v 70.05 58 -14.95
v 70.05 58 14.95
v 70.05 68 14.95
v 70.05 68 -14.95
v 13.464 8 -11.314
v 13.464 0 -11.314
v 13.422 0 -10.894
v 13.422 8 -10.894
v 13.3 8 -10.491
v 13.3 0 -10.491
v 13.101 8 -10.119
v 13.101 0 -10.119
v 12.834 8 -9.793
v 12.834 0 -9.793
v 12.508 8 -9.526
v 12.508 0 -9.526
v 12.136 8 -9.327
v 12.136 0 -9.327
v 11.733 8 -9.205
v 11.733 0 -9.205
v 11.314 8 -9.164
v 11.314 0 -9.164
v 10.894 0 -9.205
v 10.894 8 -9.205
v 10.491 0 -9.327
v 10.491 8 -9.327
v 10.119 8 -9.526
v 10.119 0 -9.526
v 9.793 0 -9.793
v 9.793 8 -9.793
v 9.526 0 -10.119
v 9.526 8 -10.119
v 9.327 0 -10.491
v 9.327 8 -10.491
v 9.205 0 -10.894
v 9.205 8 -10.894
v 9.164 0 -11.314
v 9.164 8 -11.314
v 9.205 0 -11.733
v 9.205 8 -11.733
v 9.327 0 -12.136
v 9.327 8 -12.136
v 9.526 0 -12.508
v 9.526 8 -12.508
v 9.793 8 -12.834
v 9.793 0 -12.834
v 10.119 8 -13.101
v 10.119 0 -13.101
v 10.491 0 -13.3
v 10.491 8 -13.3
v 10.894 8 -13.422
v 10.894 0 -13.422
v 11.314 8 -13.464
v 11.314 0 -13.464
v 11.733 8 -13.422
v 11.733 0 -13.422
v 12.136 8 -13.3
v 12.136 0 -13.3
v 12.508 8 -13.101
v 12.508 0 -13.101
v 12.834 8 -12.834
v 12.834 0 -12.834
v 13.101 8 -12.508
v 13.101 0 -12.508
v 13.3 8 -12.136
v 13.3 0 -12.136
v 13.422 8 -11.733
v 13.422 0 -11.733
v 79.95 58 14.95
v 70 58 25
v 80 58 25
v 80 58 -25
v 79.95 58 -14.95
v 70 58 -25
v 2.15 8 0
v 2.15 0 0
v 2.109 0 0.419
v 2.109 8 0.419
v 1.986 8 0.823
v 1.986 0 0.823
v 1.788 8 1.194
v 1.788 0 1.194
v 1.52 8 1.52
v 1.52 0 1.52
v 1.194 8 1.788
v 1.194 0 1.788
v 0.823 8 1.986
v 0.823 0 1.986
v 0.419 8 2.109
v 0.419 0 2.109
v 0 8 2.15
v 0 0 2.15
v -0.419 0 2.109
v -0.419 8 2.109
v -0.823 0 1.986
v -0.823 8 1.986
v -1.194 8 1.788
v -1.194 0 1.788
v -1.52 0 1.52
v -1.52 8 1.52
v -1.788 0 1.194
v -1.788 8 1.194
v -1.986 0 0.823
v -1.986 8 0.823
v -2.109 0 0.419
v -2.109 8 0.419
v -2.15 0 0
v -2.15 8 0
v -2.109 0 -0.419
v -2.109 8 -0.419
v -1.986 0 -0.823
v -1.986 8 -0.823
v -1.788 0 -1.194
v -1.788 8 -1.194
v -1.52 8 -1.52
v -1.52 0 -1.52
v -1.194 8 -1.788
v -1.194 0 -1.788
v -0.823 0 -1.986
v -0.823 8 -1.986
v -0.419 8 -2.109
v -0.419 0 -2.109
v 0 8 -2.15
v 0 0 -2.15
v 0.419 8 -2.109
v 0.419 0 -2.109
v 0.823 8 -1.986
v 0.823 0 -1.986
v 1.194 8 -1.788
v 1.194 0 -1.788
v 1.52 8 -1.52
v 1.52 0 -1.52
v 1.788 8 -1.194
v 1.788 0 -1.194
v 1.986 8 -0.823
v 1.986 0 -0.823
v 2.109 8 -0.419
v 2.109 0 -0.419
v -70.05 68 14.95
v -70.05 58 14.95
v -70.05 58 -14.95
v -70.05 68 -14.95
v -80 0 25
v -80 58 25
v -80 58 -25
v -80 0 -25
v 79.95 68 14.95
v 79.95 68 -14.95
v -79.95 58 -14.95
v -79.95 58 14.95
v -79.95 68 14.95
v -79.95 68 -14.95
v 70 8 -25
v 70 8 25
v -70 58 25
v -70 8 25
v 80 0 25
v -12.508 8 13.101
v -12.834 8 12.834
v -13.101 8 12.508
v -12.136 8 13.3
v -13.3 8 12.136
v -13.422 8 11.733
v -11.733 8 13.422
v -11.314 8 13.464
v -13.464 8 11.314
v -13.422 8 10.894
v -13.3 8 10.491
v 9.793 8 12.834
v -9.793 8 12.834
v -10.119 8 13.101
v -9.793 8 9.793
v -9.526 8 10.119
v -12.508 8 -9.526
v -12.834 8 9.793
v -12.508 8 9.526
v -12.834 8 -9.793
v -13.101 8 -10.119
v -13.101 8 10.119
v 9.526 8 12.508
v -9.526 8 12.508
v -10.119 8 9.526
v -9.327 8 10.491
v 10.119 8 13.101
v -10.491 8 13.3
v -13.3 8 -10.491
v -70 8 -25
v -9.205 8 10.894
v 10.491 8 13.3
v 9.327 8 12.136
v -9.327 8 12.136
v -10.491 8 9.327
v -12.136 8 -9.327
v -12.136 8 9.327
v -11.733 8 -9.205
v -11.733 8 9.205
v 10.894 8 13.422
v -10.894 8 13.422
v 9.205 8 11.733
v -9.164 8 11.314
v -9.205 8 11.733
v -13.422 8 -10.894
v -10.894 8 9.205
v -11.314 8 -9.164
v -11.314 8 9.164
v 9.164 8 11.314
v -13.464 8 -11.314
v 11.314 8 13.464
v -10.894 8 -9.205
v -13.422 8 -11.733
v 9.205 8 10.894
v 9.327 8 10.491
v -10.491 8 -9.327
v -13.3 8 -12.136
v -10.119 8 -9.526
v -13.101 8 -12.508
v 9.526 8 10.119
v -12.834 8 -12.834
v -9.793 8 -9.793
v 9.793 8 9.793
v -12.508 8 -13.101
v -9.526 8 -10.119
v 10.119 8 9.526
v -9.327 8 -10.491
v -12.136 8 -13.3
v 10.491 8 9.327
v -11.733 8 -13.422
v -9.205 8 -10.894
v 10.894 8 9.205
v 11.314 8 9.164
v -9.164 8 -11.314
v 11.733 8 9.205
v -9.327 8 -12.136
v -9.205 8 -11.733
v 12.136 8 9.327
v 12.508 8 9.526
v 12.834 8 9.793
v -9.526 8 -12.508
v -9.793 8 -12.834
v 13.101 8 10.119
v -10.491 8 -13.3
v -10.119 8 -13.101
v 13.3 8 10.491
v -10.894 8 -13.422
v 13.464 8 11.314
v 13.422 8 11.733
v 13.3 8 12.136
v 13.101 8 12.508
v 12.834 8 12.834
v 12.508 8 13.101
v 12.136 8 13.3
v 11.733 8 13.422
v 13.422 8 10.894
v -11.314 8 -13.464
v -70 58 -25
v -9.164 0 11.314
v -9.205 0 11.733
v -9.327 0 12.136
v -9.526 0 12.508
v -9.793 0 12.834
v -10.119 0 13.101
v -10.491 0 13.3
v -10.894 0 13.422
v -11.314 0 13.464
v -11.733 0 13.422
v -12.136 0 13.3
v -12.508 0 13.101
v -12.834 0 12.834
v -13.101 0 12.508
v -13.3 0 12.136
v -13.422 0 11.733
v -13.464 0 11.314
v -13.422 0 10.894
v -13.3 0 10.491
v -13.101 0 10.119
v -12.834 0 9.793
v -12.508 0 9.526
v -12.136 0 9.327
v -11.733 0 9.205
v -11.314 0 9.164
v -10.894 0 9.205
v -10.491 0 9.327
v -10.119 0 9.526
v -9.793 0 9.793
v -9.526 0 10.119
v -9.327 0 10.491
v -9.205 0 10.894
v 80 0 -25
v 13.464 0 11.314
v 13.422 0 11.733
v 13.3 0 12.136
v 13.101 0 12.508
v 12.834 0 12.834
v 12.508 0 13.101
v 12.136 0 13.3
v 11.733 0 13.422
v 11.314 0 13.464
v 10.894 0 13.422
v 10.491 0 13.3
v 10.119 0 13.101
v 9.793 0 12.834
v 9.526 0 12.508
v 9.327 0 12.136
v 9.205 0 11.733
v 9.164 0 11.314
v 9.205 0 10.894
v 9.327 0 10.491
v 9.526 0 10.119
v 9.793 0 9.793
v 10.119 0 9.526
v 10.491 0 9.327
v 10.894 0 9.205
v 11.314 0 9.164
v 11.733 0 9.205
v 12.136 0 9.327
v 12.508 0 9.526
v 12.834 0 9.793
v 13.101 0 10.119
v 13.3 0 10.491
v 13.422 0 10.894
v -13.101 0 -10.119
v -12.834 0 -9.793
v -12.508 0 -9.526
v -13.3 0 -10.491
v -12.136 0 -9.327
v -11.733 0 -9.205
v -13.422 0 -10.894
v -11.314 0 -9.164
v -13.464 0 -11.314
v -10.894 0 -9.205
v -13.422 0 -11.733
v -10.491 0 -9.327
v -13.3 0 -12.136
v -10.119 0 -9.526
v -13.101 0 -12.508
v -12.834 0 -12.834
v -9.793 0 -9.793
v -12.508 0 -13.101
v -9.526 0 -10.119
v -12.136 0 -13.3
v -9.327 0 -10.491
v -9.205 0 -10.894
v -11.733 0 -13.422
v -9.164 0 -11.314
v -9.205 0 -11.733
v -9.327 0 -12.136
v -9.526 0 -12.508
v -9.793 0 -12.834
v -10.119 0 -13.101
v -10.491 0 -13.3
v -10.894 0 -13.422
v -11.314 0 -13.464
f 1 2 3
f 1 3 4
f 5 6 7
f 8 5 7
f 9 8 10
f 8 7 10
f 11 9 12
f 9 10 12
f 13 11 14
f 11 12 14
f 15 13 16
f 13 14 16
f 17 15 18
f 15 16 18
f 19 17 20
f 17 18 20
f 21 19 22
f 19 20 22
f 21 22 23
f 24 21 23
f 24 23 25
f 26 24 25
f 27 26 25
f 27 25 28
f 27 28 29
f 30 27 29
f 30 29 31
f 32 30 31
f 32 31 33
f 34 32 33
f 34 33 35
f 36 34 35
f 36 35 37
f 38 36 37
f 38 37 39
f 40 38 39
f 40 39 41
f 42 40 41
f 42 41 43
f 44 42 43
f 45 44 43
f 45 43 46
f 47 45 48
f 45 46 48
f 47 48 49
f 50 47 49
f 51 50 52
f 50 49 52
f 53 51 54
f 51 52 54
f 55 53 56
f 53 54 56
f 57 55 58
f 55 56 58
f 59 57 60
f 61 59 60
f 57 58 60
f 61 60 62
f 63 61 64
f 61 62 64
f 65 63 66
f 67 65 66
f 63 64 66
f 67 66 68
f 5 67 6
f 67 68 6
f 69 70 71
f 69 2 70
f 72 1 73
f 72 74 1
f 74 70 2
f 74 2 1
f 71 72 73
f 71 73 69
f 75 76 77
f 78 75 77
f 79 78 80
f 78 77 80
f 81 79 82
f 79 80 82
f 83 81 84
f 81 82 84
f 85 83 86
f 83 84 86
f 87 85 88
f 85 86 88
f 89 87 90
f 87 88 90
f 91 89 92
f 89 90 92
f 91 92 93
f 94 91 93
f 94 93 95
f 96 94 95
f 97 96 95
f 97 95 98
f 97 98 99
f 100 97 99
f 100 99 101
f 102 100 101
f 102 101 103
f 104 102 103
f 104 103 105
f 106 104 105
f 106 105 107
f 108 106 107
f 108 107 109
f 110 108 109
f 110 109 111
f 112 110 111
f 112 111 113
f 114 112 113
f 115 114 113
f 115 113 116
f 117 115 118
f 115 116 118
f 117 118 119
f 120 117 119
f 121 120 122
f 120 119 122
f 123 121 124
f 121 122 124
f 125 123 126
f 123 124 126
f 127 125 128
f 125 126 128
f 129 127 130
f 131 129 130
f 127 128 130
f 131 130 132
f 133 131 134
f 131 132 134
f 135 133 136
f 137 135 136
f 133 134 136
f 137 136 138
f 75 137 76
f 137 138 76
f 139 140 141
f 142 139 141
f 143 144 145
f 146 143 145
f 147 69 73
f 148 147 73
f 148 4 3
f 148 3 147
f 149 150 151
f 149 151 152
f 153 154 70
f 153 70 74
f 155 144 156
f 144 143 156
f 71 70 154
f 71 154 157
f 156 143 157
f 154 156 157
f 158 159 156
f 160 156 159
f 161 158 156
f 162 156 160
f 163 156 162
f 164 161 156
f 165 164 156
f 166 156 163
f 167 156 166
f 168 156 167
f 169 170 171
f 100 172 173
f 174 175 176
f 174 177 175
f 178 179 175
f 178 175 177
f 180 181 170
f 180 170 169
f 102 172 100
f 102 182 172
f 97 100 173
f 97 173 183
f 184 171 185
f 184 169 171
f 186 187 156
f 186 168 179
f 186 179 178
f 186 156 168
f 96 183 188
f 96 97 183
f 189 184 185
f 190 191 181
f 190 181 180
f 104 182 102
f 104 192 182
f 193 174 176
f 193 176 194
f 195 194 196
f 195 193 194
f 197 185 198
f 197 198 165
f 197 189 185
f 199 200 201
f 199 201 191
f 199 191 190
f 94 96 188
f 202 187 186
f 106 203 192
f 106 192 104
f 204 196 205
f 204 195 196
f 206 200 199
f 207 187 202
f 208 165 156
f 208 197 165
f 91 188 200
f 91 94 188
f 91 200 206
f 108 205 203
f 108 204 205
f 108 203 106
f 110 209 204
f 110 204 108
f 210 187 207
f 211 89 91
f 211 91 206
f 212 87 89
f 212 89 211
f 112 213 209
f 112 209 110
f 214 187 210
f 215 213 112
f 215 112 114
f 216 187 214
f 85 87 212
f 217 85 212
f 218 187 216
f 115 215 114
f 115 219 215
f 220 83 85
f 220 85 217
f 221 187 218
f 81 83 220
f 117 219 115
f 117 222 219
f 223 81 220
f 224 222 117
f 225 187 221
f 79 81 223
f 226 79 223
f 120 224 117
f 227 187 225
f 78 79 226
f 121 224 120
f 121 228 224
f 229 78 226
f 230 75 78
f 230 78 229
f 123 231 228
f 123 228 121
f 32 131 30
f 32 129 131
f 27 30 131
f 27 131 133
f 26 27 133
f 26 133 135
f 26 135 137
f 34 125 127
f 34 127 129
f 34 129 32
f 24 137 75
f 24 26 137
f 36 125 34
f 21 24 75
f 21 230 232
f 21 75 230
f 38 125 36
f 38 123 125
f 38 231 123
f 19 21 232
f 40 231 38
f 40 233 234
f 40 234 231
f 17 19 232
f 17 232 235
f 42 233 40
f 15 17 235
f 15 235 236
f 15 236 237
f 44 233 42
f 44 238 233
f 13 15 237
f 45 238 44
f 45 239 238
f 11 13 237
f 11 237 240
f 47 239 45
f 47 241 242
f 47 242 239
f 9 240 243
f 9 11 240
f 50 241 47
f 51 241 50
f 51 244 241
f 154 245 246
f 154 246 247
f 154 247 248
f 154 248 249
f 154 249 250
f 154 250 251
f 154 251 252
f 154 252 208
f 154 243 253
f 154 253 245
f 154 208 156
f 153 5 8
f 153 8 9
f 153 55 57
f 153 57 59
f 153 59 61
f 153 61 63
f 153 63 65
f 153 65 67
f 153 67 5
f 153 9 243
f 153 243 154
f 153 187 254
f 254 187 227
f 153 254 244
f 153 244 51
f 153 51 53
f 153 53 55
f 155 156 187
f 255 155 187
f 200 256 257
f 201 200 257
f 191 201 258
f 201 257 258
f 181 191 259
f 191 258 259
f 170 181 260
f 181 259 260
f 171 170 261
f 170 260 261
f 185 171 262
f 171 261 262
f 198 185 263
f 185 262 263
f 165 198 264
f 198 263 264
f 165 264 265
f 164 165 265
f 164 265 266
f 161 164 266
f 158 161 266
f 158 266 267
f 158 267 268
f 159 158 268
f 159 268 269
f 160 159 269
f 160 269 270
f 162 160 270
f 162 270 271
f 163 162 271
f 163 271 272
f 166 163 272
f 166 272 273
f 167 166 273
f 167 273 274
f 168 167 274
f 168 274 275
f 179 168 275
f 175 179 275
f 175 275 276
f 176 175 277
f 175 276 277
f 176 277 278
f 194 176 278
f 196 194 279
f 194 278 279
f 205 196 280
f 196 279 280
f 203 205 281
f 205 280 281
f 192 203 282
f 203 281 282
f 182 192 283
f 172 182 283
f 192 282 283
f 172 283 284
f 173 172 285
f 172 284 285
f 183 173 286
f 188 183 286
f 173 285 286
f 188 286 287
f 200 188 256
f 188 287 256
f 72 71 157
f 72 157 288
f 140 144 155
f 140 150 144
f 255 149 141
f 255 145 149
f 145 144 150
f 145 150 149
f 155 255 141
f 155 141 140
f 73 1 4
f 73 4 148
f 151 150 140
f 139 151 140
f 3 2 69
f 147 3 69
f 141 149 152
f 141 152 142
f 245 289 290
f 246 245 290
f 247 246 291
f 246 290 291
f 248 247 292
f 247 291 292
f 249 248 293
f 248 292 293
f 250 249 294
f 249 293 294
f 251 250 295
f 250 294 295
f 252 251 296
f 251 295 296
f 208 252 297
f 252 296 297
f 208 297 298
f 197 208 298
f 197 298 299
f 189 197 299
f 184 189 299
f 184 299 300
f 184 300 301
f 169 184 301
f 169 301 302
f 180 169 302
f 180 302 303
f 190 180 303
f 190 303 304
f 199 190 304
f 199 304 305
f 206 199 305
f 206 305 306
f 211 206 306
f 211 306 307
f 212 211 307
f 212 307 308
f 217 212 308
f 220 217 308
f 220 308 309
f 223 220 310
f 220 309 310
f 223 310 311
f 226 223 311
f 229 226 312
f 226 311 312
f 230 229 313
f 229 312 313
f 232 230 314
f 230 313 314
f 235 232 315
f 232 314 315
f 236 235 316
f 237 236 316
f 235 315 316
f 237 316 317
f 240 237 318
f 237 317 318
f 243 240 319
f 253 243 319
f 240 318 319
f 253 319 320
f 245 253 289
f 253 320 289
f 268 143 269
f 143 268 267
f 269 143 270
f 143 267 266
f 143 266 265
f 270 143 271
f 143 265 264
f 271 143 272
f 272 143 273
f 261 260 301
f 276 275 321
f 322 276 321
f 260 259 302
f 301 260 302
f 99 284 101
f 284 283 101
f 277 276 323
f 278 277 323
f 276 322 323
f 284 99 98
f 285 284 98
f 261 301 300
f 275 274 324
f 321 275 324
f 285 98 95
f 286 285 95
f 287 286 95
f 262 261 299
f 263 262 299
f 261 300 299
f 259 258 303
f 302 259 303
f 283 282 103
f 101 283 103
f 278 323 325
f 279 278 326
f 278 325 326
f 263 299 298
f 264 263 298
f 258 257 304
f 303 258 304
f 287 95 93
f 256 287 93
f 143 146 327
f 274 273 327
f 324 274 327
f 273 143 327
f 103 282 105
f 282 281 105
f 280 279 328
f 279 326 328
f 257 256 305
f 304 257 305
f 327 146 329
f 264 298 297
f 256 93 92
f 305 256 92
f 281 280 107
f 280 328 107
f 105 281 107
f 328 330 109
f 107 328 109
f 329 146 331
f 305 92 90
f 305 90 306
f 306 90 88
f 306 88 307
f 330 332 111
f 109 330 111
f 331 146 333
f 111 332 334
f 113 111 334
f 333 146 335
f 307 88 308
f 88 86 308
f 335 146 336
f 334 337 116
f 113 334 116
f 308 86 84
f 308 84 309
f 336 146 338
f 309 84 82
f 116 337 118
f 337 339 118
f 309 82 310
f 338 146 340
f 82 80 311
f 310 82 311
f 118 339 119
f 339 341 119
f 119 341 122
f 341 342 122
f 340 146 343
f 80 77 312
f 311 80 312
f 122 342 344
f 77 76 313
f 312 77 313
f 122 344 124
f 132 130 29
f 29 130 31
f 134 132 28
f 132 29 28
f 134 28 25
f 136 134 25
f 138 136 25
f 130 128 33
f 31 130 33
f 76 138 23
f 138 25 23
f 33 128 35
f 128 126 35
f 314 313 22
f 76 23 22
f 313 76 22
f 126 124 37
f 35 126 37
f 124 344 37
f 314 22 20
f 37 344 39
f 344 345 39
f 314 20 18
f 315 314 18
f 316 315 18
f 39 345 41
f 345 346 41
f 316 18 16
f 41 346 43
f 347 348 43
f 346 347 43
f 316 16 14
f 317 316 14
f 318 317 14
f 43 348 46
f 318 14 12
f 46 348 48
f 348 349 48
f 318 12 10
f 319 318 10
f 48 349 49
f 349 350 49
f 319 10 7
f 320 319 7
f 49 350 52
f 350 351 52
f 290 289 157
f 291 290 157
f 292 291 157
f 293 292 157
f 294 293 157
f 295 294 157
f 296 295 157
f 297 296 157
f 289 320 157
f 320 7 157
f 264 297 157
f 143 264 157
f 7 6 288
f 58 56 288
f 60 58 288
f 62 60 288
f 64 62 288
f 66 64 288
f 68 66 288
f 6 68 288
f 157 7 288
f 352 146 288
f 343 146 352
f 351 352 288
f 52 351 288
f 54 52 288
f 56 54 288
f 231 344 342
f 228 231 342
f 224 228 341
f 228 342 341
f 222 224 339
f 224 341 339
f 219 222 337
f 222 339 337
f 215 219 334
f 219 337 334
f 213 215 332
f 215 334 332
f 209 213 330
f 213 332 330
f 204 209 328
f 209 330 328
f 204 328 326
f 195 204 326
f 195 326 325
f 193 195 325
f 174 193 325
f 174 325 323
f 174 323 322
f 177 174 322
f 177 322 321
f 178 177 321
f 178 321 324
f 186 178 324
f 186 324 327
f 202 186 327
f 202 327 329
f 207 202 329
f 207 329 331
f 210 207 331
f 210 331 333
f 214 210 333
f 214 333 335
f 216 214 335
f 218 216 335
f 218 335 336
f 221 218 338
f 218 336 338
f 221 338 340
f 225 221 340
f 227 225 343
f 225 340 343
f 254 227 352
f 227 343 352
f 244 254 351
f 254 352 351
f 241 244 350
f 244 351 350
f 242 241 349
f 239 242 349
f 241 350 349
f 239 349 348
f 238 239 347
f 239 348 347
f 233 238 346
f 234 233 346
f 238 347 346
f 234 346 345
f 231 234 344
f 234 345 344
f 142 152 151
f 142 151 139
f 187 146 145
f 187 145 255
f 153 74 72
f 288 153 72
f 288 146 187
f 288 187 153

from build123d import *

# Parameters (mm, degrees)
SKETCH1_W           = 160
SKETCH1_H           = 50
BOSS_EXTRUDE1_DEPTH = 8
SKETCH2_W           = 10
SKETCH2_H           = 50
BOSS_EXTRUDE2_DEPTH = 50
SKETCH3_W           = 9.9
SKETCH3_H           = 29.9
BOSS_EXTRUDE3_DEPTH = 10
CUT_EXTRUDE1_REACH  = 70
SKETCH4_R           = 2.15


with BuildPart() as part:
    # Sketch1 → Boss-Extrude1 (new body)
    with BuildSketch(Plane(origin=(0, 0, 0), x_dir=(1, 0, 0), z_dir=(0, 1, 0))):
        Rectangle(SKETCH1_W, SKETCH1_H)
    extrude(amount=BOSS_EXTRUDE1_DEPTH)

    # Sketch2 → Boss-Extrude2 (add)
    with BuildSketch(Plane(origin=(0, 8, 0), x_dir=(1, 0, 0), z_dir=(0, 1, 0))):
        with Locations((-75, 0)):
            Rectangle(SKETCH2_W, SKETCH2_H)
        with Locations((75, 0)):
            Rectangle(SKETCH2_W, SKETCH2_H)
    extrude(amount=BOSS_EXTRUDE2_DEPTH)

    # Sketch3 → Boss-Extrude3 (add)
    with BuildSketch(Plane(origin=(0, 58, 0), x_dir=(1, 0, 0), z_dir=(0, 1, 0))):
        with Locations((-75, 0)):
            Rectangle(SKETCH3_W, SKETCH3_H)
        with Locations((75, 0)):
            Rectangle(SKETCH3_W, SKETCH3_H)
    extrude(amount=BOSS_EXTRUDE3_DEPTH)

    # Sketch4 → Cut-Extrude1 (cut, up to next)
    with BuildSketch(Plane.XZ, mode=Mode.PRIVATE) as cut_extrude1_sk1:
        Circle(SKETCH4_R)
    cut_extrude1_tool1 = extrude(cut_extrude1_sk1.sketch, amount=-CUT_EXTRUDE1_REACH, mode=Mode.PRIVATE) & part.part
    add(cut_extrude1_tool1.solids().sort_by_distance((0, 0, 0))[0], mode=Mode.SUBTRACT)
    # Sketch4 → Cut-Extrude1 (cut, up to next)
    with BuildSketch(Plane.XZ, mode=Mode.PRIVATE) as cut_extrude1_sk2:
        with Locations((-11.313708499, 11.313708499)):
            Circle(SKETCH4_R)
    cut_extrude1_tool2 = extrude(cut_extrude1_sk2.sketch, amount=-CUT_EXTRUDE1_REACH, mode=Mode.PRIVATE) & part.part
    add(cut_extrude1_tool2.solids().sort_by_distance((-11.313708, 0, 11.313708))[0], mode=Mode.SUBTRACT)
    # Sketch4 → Cut-Extrude1 (cut, up to next)
    with BuildSketch(Plane.XZ, mode=Mode.PRIVATE) as cut_extrude1_sk3:
        with Locations((11.313708499, 11.313708499)):
            Circle(SKETCH4_R)
    cut_extrude1_tool3 = extrude(cut_extrude1_sk3.sketch, amount=-CUT_EXTRUDE1_REACH, mode=Mode.PRIVATE) & part.part
    add(cut_extrude1_tool3.solids().sort_by_distance((11.313708, 0, 11.313708))[0], mode=Mode.SUBTRACT)
    # Sketch4 → Cut-Extrude1 (cut, up to next)
    with BuildSketch(Plane.XZ, mode=Mode.PRIVATE) as cut_extrude1_sk4:
        with Locations((11.313708499, -11.313708499)):
            Circle(SKETCH4_R)
    cut_extrude1_tool4 = extrude(cut_extrude1_sk4.sketch, amount=-CUT_EXTRUDE1_REACH, mode=Mode.PRIVATE) & part.part
    add(cut_extrude1_tool4.solids().sort_by_distance((11.313708, 0, -11.313708))[0], mode=Mode.SUBTRACT)
    # Sketch4 → Cut-Extrude1 (cut, up to next)
    with BuildSketch(Plane.XZ, mode=Mode.PRIVATE) as cut_extrude1_sk5:
        with Locations((-11.313708499, -11.313708499)):
            Circle(SKETCH4_R)
    cut_extrude1_tool5 = extrude(cut_extrude1_sk5.sketch, amount=-CUT_EXTRUDE1_REACH, mode=Mode.PRIVATE) & part.part
    add(cut_extrude1_tool5.solids().sort_by_distance((-11.313708, 0, -11.313708))[0], mode=Mode.SUBTRACT)


solid = part.part
